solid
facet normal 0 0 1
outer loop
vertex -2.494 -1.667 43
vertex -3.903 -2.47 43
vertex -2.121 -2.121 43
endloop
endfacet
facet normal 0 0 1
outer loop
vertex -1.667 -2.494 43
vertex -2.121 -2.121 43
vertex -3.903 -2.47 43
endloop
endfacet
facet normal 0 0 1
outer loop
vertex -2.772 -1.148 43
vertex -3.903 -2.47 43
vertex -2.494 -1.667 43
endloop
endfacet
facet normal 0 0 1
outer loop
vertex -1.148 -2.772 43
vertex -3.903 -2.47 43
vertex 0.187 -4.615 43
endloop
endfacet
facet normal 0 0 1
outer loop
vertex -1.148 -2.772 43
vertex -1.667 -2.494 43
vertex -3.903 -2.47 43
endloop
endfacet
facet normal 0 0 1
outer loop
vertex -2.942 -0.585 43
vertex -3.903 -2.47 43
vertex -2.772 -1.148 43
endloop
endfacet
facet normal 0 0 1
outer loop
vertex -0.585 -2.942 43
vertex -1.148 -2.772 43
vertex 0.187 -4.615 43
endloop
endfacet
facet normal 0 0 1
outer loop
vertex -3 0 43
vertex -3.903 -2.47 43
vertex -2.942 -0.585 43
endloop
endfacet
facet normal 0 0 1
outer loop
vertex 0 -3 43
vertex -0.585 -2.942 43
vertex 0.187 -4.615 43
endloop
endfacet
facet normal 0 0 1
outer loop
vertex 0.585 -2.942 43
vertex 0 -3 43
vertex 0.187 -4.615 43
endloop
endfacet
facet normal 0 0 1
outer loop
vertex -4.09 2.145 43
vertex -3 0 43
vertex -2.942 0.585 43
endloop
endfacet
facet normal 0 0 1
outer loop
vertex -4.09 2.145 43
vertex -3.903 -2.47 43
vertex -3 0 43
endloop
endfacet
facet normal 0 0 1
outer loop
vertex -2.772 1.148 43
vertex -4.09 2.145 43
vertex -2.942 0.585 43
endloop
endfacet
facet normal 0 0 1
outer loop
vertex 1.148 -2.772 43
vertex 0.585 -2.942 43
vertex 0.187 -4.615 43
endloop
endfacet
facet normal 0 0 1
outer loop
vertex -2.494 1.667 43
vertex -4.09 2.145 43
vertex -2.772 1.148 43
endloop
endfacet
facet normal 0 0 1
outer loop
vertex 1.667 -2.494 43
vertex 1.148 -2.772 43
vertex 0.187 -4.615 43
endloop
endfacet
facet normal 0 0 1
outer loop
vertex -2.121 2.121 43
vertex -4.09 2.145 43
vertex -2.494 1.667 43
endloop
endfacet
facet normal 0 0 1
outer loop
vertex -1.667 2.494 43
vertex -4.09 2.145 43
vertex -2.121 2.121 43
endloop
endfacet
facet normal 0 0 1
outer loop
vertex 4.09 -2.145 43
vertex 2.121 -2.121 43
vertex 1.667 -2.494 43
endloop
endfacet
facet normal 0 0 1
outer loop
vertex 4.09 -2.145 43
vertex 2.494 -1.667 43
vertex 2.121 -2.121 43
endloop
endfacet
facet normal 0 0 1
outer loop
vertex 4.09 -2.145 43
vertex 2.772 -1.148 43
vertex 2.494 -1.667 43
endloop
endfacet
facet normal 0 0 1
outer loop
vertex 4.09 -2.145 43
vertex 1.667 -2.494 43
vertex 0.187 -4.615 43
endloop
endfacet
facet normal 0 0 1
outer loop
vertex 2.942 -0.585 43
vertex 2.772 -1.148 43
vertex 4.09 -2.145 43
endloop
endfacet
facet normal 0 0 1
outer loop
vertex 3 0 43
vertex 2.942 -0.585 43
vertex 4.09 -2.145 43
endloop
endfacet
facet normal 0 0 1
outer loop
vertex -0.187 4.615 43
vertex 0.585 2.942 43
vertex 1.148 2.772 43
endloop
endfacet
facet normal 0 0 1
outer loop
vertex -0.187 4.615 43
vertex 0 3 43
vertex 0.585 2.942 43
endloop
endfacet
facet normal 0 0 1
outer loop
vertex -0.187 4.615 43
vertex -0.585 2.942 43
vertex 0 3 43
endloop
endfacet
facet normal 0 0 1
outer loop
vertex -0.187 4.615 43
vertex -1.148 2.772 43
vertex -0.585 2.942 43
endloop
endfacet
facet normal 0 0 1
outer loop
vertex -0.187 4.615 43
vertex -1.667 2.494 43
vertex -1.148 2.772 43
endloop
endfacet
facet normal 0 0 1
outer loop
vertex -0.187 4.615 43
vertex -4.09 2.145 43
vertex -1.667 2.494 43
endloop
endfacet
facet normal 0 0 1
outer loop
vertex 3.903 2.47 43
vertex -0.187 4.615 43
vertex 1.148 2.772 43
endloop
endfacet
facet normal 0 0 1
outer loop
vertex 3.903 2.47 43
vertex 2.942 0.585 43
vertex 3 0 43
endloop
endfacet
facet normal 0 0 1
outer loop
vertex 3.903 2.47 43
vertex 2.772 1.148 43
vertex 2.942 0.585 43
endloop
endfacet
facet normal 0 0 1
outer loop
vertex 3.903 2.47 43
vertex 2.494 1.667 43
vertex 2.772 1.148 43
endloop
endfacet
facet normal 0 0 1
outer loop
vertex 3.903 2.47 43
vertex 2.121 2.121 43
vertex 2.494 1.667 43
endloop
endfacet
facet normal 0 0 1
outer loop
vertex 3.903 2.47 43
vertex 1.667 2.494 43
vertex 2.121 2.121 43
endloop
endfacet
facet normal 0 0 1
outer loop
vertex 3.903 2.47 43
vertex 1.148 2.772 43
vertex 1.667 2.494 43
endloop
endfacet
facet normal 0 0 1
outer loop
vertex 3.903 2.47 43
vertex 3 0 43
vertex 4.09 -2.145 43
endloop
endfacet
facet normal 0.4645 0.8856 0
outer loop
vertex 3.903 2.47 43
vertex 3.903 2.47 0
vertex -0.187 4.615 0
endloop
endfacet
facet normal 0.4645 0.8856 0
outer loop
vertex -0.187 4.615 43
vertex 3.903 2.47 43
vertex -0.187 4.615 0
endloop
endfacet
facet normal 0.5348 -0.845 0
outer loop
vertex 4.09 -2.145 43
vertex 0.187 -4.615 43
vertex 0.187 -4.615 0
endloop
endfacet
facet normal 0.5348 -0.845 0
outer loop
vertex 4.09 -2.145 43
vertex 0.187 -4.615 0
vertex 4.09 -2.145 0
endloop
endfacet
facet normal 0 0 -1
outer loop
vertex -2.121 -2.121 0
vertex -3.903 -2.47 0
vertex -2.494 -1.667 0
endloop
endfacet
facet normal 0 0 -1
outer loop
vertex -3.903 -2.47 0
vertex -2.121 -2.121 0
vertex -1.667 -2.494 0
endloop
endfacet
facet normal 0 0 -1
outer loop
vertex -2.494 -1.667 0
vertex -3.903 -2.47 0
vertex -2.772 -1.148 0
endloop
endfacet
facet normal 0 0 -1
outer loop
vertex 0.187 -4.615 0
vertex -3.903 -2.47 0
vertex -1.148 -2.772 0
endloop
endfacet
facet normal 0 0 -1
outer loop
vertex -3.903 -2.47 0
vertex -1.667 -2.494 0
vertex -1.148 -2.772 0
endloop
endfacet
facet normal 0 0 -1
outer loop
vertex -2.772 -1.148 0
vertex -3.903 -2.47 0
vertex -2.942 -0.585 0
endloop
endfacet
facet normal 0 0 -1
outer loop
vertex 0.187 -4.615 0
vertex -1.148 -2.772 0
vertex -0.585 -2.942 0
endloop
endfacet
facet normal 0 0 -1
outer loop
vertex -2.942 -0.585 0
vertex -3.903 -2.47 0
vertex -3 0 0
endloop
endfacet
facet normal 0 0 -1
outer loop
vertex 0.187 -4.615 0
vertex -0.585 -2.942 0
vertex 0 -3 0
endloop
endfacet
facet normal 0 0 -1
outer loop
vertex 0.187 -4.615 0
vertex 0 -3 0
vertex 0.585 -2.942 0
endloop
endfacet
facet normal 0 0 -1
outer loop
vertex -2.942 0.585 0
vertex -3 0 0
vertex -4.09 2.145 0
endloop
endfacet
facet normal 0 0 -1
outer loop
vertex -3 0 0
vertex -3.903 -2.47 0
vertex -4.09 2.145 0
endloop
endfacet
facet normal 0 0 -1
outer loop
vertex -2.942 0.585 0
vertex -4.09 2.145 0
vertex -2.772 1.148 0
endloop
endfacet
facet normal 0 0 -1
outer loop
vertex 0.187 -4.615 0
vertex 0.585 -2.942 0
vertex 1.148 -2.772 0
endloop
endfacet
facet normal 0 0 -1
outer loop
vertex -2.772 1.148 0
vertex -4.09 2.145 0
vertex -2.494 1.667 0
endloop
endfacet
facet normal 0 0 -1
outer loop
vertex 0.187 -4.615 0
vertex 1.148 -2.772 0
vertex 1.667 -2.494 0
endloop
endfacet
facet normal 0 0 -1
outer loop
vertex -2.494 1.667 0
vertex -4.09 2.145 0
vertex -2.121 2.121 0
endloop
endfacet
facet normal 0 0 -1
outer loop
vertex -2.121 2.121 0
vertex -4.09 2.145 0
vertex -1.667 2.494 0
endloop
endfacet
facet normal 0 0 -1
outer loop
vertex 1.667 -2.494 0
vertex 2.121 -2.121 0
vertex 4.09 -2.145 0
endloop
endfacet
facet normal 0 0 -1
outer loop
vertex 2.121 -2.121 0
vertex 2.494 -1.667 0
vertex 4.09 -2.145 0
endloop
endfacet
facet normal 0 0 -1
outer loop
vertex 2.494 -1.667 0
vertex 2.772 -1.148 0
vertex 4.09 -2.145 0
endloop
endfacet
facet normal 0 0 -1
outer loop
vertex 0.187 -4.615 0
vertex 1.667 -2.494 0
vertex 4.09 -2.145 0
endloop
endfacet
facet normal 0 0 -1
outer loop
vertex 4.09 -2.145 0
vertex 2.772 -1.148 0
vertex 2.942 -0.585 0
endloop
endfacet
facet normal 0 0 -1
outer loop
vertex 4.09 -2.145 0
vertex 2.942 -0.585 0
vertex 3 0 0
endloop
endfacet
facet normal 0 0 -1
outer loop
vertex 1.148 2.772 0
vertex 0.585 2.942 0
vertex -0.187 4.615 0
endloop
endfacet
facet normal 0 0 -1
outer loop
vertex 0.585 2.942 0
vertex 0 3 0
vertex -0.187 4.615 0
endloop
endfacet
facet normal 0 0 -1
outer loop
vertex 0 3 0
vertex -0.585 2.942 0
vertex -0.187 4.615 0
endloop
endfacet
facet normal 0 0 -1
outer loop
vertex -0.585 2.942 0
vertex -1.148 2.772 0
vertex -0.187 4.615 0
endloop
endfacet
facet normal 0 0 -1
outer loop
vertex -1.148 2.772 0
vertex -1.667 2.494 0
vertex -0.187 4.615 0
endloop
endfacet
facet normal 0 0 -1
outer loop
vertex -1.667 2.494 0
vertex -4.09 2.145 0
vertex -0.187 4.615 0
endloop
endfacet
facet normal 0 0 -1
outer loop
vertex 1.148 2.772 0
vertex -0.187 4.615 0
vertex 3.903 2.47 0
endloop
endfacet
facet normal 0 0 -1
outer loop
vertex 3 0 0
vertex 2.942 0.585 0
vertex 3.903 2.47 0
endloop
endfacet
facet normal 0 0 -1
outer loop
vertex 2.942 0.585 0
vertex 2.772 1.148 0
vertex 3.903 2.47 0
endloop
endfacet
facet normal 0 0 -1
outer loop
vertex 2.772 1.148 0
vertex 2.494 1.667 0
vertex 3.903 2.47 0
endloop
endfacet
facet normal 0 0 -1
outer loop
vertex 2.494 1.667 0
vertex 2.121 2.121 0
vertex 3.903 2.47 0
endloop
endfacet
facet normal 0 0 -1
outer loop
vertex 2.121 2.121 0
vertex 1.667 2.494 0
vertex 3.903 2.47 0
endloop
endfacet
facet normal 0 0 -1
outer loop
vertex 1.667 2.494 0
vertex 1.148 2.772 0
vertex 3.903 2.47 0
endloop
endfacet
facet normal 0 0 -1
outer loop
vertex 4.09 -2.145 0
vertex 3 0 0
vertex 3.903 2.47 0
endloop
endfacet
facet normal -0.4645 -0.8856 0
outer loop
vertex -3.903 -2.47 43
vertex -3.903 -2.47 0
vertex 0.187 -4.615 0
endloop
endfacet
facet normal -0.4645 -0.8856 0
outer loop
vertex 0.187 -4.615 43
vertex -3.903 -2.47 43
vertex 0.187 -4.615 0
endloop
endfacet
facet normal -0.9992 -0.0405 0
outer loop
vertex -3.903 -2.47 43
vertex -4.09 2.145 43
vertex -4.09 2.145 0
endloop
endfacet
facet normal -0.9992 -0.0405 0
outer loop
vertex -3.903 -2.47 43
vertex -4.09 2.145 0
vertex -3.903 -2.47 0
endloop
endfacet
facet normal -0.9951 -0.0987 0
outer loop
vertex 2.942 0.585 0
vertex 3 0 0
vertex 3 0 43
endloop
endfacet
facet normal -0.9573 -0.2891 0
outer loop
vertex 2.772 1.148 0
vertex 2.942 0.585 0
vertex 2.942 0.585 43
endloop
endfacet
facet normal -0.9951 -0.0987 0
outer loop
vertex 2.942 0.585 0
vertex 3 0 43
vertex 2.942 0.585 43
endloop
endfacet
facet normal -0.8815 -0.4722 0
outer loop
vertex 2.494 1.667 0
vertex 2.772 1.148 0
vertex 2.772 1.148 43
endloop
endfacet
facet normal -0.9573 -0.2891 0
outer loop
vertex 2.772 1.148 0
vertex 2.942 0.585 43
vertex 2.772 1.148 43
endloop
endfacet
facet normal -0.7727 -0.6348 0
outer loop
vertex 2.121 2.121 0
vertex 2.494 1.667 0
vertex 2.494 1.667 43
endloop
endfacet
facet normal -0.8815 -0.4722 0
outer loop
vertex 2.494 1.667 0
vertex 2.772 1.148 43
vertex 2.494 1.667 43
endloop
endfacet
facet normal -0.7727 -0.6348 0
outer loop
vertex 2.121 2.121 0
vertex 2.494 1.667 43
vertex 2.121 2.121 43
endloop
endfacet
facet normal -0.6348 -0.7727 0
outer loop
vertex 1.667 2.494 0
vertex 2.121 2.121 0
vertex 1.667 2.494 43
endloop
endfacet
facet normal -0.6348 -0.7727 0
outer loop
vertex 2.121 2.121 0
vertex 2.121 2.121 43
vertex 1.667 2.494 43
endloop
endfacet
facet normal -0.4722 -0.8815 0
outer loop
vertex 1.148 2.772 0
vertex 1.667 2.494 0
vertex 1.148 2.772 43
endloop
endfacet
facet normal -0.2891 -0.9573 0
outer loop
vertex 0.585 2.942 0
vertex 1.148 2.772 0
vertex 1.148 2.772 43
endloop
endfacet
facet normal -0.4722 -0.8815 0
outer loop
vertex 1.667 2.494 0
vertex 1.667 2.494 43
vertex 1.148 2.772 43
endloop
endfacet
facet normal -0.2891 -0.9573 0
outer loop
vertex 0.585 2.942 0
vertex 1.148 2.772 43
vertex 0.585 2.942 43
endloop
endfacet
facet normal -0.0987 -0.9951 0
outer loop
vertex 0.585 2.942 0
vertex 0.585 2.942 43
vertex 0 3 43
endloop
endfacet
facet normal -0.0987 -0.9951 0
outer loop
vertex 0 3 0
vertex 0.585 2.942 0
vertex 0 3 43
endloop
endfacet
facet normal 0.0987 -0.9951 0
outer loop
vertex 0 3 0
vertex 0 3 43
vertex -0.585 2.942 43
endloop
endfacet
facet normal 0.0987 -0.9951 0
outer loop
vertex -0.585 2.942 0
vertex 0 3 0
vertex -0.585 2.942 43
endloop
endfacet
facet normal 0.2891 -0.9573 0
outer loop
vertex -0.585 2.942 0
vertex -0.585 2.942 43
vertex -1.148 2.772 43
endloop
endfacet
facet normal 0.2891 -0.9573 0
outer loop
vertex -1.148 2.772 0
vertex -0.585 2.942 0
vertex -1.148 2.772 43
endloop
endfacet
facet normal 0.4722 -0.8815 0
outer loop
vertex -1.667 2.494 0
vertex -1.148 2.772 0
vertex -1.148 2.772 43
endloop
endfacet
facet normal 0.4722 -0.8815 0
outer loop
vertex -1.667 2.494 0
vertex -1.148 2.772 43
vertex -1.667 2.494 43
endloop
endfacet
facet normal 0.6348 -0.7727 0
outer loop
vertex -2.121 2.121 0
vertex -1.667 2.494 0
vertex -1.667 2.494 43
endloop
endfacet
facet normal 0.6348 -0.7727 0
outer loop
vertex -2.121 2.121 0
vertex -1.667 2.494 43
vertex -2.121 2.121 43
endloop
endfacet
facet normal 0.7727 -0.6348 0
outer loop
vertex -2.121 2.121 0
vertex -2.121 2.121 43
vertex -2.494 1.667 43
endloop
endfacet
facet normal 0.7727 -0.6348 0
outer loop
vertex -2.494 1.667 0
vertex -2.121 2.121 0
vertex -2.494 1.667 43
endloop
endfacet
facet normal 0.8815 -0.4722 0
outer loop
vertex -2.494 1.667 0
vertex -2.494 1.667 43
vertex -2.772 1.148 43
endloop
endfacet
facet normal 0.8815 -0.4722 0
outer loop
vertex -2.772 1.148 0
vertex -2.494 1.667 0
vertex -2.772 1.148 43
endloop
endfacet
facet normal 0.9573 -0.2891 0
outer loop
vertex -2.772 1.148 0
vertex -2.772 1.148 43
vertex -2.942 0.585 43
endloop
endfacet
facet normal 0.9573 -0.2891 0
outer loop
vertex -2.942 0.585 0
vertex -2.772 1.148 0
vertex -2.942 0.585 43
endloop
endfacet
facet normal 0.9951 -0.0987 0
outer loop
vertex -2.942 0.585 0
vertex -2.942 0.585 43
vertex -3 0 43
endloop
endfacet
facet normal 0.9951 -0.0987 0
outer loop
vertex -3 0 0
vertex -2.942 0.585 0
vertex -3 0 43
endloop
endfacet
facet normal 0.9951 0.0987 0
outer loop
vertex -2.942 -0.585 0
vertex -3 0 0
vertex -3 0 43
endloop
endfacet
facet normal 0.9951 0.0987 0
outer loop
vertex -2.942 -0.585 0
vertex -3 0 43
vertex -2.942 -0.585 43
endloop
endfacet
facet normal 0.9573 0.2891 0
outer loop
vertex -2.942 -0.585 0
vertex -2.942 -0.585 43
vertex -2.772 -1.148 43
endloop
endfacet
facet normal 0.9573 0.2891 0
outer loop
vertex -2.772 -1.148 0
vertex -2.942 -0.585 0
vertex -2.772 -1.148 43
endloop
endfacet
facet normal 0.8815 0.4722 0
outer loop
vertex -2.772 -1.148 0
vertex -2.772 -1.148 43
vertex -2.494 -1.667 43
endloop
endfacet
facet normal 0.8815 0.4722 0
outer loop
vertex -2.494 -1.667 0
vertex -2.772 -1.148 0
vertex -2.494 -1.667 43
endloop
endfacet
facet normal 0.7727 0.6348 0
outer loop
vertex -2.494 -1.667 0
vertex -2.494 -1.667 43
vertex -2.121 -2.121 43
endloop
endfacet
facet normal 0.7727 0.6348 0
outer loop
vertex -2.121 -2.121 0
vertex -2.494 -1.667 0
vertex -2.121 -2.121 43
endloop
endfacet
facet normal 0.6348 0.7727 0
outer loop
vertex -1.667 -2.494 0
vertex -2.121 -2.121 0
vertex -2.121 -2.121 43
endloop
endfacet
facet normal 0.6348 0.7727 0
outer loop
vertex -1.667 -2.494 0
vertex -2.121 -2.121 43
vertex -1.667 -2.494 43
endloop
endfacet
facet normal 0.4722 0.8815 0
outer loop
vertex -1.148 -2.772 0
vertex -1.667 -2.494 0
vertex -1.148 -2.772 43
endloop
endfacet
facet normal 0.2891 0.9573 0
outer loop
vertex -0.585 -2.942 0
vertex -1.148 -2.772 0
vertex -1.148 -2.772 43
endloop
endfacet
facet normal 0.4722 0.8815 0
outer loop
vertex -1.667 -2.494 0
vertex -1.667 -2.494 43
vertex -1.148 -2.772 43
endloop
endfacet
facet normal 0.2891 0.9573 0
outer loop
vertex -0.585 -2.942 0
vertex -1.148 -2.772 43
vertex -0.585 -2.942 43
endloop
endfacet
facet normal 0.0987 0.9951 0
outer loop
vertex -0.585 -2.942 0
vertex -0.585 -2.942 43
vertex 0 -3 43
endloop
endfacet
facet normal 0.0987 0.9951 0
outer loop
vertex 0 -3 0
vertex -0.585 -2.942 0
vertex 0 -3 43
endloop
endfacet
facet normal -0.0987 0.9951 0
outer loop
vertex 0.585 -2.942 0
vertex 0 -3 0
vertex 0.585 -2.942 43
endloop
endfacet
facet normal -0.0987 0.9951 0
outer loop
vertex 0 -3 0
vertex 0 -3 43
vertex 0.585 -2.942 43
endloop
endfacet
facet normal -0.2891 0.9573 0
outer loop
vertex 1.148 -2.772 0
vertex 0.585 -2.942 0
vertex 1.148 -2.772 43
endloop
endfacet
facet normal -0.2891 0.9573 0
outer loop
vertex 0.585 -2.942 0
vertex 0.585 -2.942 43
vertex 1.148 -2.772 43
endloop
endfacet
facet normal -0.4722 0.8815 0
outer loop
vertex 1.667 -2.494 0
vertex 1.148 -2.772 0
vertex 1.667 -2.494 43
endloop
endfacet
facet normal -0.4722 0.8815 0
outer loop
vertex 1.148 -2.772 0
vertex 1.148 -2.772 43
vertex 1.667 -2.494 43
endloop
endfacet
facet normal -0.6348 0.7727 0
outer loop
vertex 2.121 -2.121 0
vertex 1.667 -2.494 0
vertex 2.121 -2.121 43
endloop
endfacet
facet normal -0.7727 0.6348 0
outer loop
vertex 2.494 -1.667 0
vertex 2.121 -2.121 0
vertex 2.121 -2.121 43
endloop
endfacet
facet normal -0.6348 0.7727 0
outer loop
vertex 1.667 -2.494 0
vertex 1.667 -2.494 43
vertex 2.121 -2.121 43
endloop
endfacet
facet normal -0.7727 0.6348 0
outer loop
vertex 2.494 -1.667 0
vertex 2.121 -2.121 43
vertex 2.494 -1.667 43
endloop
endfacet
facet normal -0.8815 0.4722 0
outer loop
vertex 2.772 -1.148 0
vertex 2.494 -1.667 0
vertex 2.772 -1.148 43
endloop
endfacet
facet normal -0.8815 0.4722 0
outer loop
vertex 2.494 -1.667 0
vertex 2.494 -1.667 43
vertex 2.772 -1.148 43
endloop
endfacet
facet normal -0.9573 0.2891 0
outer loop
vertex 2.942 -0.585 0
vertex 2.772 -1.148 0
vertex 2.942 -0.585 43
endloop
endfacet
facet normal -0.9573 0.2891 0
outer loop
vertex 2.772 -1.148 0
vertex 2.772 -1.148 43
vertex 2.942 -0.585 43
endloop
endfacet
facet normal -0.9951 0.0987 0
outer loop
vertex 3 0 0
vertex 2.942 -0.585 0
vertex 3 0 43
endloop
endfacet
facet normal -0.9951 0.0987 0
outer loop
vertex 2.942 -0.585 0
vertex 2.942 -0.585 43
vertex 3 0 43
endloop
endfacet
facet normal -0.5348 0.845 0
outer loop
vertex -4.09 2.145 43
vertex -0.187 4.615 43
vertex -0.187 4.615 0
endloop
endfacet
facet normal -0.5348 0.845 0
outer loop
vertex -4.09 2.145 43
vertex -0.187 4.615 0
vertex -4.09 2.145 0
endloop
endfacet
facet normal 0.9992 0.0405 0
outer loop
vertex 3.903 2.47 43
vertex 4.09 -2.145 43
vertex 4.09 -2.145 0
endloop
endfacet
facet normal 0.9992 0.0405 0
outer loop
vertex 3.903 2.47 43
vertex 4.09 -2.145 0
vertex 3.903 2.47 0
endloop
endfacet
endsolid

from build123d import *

# Parameters (mm, degrees)
EXTRUDE_1_DEPTH     = 43
CUT_EXTRUDE_1_REACH = 45
SKETCH_2_R          = 3


with BuildPart() as part:
    # 草图1 → 凸台-拉伸1 (new body)
    with BuildSketch(Plane.XY):
        Polygon((4.090282793, -2.145441681), (3.903148395, 2.469567967), (-0.187134399, 4.615009648), (-4.090282793, 2.145441681), (-3.903148395, -2.469567967), (0.187134399, -4.615009648), align=None)
    extrude(amount=EXTRUDE_1_DEPTH)

    # 草图2 → 切除-拉伸1 (cut, up to next)
    with BuildSketch(Plane.XY.offset(43), mode=Mode.PRIVATE) as cut_extrude_1_sk1:
        Circle(SKETCH_2_R)
    cut_extrude_1_tool1 = extrude(cut_extrude_1_sk1.sketch, amount=-CUT_EXTRUDE_1_REACH, mode=Mode.PRIVATE) & part.part
    add(cut_extrude_1_tool1.solids().sort_by_distance((0, 0, 43))[0], mode=Mode.SUBTRACT)


solid = part.part
